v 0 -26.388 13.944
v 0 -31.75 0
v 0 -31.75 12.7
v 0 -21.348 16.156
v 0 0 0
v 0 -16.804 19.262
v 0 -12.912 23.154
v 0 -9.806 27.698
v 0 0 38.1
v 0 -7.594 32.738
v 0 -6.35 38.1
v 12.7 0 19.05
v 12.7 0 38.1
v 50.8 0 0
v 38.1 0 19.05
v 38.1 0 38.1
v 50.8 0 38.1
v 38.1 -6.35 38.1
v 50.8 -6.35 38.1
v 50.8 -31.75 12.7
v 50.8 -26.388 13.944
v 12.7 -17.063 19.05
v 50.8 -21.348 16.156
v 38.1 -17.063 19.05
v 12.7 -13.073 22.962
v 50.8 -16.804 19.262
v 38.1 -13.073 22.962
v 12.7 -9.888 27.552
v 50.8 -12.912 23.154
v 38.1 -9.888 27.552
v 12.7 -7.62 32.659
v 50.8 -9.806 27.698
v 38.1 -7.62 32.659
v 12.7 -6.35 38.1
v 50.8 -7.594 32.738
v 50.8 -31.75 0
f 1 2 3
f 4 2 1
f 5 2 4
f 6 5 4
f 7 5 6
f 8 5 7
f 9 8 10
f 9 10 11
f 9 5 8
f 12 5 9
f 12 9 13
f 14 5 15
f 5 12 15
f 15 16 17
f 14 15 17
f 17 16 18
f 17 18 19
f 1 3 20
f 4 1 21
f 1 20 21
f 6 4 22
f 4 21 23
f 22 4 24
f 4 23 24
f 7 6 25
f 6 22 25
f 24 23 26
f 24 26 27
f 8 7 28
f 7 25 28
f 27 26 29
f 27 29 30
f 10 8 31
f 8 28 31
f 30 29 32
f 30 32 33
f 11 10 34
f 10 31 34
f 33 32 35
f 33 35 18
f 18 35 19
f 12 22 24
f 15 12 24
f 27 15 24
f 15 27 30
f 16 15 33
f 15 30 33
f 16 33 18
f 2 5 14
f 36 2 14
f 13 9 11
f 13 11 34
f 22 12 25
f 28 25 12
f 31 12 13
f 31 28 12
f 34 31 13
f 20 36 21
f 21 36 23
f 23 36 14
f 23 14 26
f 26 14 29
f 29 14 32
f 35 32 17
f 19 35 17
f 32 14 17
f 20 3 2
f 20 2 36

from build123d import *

# Parameters (mm, degrees)
F0_W     = 50.8
F0_H     = 38.1
F1_DEPTH = 31.75
F2_W     = 25.4
F2_H     = 19.05
F3_DEPTH = 31.75
F5_DEPTH = 50.8


with BuildPart() as f1:
    # F0 (on Front) → F1 (new body)
    with BuildSketch(Plane.XZ):
        with Locations((25.4, 19.05)):
            Rectangle(F0_W, F0_H)
    extrude(amount=F1_DEPTH)

    # F2 (on face) → F3 (cut)
    with BuildSketch(Plane.XZ.offset(31.75)):
        with Locations((25.4, 28.575)):
            Rectangle(F2_W, F2_H)
    extrude(amount=-F3_DEPTH, mode=Mode.SUBTRACT)

    # F4 (on face) → F5 (cut)
    with BuildSketch(Plane.YZ.offset(50.8)):
        with BuildLine():
            Line((-31.75, 38.1), (-31.75, 12.7))
            ThreePointArc((-31.75, 12.7), (-14.767814, 21.117814), (-6.35, 38.1))
            Line((-6.35, 38.1), (-31.75, 38.1))
        make_face()
    extrude(amount=-F5_DEPTH, mode=Mode.SUBTRACT)


solid = f1.part
